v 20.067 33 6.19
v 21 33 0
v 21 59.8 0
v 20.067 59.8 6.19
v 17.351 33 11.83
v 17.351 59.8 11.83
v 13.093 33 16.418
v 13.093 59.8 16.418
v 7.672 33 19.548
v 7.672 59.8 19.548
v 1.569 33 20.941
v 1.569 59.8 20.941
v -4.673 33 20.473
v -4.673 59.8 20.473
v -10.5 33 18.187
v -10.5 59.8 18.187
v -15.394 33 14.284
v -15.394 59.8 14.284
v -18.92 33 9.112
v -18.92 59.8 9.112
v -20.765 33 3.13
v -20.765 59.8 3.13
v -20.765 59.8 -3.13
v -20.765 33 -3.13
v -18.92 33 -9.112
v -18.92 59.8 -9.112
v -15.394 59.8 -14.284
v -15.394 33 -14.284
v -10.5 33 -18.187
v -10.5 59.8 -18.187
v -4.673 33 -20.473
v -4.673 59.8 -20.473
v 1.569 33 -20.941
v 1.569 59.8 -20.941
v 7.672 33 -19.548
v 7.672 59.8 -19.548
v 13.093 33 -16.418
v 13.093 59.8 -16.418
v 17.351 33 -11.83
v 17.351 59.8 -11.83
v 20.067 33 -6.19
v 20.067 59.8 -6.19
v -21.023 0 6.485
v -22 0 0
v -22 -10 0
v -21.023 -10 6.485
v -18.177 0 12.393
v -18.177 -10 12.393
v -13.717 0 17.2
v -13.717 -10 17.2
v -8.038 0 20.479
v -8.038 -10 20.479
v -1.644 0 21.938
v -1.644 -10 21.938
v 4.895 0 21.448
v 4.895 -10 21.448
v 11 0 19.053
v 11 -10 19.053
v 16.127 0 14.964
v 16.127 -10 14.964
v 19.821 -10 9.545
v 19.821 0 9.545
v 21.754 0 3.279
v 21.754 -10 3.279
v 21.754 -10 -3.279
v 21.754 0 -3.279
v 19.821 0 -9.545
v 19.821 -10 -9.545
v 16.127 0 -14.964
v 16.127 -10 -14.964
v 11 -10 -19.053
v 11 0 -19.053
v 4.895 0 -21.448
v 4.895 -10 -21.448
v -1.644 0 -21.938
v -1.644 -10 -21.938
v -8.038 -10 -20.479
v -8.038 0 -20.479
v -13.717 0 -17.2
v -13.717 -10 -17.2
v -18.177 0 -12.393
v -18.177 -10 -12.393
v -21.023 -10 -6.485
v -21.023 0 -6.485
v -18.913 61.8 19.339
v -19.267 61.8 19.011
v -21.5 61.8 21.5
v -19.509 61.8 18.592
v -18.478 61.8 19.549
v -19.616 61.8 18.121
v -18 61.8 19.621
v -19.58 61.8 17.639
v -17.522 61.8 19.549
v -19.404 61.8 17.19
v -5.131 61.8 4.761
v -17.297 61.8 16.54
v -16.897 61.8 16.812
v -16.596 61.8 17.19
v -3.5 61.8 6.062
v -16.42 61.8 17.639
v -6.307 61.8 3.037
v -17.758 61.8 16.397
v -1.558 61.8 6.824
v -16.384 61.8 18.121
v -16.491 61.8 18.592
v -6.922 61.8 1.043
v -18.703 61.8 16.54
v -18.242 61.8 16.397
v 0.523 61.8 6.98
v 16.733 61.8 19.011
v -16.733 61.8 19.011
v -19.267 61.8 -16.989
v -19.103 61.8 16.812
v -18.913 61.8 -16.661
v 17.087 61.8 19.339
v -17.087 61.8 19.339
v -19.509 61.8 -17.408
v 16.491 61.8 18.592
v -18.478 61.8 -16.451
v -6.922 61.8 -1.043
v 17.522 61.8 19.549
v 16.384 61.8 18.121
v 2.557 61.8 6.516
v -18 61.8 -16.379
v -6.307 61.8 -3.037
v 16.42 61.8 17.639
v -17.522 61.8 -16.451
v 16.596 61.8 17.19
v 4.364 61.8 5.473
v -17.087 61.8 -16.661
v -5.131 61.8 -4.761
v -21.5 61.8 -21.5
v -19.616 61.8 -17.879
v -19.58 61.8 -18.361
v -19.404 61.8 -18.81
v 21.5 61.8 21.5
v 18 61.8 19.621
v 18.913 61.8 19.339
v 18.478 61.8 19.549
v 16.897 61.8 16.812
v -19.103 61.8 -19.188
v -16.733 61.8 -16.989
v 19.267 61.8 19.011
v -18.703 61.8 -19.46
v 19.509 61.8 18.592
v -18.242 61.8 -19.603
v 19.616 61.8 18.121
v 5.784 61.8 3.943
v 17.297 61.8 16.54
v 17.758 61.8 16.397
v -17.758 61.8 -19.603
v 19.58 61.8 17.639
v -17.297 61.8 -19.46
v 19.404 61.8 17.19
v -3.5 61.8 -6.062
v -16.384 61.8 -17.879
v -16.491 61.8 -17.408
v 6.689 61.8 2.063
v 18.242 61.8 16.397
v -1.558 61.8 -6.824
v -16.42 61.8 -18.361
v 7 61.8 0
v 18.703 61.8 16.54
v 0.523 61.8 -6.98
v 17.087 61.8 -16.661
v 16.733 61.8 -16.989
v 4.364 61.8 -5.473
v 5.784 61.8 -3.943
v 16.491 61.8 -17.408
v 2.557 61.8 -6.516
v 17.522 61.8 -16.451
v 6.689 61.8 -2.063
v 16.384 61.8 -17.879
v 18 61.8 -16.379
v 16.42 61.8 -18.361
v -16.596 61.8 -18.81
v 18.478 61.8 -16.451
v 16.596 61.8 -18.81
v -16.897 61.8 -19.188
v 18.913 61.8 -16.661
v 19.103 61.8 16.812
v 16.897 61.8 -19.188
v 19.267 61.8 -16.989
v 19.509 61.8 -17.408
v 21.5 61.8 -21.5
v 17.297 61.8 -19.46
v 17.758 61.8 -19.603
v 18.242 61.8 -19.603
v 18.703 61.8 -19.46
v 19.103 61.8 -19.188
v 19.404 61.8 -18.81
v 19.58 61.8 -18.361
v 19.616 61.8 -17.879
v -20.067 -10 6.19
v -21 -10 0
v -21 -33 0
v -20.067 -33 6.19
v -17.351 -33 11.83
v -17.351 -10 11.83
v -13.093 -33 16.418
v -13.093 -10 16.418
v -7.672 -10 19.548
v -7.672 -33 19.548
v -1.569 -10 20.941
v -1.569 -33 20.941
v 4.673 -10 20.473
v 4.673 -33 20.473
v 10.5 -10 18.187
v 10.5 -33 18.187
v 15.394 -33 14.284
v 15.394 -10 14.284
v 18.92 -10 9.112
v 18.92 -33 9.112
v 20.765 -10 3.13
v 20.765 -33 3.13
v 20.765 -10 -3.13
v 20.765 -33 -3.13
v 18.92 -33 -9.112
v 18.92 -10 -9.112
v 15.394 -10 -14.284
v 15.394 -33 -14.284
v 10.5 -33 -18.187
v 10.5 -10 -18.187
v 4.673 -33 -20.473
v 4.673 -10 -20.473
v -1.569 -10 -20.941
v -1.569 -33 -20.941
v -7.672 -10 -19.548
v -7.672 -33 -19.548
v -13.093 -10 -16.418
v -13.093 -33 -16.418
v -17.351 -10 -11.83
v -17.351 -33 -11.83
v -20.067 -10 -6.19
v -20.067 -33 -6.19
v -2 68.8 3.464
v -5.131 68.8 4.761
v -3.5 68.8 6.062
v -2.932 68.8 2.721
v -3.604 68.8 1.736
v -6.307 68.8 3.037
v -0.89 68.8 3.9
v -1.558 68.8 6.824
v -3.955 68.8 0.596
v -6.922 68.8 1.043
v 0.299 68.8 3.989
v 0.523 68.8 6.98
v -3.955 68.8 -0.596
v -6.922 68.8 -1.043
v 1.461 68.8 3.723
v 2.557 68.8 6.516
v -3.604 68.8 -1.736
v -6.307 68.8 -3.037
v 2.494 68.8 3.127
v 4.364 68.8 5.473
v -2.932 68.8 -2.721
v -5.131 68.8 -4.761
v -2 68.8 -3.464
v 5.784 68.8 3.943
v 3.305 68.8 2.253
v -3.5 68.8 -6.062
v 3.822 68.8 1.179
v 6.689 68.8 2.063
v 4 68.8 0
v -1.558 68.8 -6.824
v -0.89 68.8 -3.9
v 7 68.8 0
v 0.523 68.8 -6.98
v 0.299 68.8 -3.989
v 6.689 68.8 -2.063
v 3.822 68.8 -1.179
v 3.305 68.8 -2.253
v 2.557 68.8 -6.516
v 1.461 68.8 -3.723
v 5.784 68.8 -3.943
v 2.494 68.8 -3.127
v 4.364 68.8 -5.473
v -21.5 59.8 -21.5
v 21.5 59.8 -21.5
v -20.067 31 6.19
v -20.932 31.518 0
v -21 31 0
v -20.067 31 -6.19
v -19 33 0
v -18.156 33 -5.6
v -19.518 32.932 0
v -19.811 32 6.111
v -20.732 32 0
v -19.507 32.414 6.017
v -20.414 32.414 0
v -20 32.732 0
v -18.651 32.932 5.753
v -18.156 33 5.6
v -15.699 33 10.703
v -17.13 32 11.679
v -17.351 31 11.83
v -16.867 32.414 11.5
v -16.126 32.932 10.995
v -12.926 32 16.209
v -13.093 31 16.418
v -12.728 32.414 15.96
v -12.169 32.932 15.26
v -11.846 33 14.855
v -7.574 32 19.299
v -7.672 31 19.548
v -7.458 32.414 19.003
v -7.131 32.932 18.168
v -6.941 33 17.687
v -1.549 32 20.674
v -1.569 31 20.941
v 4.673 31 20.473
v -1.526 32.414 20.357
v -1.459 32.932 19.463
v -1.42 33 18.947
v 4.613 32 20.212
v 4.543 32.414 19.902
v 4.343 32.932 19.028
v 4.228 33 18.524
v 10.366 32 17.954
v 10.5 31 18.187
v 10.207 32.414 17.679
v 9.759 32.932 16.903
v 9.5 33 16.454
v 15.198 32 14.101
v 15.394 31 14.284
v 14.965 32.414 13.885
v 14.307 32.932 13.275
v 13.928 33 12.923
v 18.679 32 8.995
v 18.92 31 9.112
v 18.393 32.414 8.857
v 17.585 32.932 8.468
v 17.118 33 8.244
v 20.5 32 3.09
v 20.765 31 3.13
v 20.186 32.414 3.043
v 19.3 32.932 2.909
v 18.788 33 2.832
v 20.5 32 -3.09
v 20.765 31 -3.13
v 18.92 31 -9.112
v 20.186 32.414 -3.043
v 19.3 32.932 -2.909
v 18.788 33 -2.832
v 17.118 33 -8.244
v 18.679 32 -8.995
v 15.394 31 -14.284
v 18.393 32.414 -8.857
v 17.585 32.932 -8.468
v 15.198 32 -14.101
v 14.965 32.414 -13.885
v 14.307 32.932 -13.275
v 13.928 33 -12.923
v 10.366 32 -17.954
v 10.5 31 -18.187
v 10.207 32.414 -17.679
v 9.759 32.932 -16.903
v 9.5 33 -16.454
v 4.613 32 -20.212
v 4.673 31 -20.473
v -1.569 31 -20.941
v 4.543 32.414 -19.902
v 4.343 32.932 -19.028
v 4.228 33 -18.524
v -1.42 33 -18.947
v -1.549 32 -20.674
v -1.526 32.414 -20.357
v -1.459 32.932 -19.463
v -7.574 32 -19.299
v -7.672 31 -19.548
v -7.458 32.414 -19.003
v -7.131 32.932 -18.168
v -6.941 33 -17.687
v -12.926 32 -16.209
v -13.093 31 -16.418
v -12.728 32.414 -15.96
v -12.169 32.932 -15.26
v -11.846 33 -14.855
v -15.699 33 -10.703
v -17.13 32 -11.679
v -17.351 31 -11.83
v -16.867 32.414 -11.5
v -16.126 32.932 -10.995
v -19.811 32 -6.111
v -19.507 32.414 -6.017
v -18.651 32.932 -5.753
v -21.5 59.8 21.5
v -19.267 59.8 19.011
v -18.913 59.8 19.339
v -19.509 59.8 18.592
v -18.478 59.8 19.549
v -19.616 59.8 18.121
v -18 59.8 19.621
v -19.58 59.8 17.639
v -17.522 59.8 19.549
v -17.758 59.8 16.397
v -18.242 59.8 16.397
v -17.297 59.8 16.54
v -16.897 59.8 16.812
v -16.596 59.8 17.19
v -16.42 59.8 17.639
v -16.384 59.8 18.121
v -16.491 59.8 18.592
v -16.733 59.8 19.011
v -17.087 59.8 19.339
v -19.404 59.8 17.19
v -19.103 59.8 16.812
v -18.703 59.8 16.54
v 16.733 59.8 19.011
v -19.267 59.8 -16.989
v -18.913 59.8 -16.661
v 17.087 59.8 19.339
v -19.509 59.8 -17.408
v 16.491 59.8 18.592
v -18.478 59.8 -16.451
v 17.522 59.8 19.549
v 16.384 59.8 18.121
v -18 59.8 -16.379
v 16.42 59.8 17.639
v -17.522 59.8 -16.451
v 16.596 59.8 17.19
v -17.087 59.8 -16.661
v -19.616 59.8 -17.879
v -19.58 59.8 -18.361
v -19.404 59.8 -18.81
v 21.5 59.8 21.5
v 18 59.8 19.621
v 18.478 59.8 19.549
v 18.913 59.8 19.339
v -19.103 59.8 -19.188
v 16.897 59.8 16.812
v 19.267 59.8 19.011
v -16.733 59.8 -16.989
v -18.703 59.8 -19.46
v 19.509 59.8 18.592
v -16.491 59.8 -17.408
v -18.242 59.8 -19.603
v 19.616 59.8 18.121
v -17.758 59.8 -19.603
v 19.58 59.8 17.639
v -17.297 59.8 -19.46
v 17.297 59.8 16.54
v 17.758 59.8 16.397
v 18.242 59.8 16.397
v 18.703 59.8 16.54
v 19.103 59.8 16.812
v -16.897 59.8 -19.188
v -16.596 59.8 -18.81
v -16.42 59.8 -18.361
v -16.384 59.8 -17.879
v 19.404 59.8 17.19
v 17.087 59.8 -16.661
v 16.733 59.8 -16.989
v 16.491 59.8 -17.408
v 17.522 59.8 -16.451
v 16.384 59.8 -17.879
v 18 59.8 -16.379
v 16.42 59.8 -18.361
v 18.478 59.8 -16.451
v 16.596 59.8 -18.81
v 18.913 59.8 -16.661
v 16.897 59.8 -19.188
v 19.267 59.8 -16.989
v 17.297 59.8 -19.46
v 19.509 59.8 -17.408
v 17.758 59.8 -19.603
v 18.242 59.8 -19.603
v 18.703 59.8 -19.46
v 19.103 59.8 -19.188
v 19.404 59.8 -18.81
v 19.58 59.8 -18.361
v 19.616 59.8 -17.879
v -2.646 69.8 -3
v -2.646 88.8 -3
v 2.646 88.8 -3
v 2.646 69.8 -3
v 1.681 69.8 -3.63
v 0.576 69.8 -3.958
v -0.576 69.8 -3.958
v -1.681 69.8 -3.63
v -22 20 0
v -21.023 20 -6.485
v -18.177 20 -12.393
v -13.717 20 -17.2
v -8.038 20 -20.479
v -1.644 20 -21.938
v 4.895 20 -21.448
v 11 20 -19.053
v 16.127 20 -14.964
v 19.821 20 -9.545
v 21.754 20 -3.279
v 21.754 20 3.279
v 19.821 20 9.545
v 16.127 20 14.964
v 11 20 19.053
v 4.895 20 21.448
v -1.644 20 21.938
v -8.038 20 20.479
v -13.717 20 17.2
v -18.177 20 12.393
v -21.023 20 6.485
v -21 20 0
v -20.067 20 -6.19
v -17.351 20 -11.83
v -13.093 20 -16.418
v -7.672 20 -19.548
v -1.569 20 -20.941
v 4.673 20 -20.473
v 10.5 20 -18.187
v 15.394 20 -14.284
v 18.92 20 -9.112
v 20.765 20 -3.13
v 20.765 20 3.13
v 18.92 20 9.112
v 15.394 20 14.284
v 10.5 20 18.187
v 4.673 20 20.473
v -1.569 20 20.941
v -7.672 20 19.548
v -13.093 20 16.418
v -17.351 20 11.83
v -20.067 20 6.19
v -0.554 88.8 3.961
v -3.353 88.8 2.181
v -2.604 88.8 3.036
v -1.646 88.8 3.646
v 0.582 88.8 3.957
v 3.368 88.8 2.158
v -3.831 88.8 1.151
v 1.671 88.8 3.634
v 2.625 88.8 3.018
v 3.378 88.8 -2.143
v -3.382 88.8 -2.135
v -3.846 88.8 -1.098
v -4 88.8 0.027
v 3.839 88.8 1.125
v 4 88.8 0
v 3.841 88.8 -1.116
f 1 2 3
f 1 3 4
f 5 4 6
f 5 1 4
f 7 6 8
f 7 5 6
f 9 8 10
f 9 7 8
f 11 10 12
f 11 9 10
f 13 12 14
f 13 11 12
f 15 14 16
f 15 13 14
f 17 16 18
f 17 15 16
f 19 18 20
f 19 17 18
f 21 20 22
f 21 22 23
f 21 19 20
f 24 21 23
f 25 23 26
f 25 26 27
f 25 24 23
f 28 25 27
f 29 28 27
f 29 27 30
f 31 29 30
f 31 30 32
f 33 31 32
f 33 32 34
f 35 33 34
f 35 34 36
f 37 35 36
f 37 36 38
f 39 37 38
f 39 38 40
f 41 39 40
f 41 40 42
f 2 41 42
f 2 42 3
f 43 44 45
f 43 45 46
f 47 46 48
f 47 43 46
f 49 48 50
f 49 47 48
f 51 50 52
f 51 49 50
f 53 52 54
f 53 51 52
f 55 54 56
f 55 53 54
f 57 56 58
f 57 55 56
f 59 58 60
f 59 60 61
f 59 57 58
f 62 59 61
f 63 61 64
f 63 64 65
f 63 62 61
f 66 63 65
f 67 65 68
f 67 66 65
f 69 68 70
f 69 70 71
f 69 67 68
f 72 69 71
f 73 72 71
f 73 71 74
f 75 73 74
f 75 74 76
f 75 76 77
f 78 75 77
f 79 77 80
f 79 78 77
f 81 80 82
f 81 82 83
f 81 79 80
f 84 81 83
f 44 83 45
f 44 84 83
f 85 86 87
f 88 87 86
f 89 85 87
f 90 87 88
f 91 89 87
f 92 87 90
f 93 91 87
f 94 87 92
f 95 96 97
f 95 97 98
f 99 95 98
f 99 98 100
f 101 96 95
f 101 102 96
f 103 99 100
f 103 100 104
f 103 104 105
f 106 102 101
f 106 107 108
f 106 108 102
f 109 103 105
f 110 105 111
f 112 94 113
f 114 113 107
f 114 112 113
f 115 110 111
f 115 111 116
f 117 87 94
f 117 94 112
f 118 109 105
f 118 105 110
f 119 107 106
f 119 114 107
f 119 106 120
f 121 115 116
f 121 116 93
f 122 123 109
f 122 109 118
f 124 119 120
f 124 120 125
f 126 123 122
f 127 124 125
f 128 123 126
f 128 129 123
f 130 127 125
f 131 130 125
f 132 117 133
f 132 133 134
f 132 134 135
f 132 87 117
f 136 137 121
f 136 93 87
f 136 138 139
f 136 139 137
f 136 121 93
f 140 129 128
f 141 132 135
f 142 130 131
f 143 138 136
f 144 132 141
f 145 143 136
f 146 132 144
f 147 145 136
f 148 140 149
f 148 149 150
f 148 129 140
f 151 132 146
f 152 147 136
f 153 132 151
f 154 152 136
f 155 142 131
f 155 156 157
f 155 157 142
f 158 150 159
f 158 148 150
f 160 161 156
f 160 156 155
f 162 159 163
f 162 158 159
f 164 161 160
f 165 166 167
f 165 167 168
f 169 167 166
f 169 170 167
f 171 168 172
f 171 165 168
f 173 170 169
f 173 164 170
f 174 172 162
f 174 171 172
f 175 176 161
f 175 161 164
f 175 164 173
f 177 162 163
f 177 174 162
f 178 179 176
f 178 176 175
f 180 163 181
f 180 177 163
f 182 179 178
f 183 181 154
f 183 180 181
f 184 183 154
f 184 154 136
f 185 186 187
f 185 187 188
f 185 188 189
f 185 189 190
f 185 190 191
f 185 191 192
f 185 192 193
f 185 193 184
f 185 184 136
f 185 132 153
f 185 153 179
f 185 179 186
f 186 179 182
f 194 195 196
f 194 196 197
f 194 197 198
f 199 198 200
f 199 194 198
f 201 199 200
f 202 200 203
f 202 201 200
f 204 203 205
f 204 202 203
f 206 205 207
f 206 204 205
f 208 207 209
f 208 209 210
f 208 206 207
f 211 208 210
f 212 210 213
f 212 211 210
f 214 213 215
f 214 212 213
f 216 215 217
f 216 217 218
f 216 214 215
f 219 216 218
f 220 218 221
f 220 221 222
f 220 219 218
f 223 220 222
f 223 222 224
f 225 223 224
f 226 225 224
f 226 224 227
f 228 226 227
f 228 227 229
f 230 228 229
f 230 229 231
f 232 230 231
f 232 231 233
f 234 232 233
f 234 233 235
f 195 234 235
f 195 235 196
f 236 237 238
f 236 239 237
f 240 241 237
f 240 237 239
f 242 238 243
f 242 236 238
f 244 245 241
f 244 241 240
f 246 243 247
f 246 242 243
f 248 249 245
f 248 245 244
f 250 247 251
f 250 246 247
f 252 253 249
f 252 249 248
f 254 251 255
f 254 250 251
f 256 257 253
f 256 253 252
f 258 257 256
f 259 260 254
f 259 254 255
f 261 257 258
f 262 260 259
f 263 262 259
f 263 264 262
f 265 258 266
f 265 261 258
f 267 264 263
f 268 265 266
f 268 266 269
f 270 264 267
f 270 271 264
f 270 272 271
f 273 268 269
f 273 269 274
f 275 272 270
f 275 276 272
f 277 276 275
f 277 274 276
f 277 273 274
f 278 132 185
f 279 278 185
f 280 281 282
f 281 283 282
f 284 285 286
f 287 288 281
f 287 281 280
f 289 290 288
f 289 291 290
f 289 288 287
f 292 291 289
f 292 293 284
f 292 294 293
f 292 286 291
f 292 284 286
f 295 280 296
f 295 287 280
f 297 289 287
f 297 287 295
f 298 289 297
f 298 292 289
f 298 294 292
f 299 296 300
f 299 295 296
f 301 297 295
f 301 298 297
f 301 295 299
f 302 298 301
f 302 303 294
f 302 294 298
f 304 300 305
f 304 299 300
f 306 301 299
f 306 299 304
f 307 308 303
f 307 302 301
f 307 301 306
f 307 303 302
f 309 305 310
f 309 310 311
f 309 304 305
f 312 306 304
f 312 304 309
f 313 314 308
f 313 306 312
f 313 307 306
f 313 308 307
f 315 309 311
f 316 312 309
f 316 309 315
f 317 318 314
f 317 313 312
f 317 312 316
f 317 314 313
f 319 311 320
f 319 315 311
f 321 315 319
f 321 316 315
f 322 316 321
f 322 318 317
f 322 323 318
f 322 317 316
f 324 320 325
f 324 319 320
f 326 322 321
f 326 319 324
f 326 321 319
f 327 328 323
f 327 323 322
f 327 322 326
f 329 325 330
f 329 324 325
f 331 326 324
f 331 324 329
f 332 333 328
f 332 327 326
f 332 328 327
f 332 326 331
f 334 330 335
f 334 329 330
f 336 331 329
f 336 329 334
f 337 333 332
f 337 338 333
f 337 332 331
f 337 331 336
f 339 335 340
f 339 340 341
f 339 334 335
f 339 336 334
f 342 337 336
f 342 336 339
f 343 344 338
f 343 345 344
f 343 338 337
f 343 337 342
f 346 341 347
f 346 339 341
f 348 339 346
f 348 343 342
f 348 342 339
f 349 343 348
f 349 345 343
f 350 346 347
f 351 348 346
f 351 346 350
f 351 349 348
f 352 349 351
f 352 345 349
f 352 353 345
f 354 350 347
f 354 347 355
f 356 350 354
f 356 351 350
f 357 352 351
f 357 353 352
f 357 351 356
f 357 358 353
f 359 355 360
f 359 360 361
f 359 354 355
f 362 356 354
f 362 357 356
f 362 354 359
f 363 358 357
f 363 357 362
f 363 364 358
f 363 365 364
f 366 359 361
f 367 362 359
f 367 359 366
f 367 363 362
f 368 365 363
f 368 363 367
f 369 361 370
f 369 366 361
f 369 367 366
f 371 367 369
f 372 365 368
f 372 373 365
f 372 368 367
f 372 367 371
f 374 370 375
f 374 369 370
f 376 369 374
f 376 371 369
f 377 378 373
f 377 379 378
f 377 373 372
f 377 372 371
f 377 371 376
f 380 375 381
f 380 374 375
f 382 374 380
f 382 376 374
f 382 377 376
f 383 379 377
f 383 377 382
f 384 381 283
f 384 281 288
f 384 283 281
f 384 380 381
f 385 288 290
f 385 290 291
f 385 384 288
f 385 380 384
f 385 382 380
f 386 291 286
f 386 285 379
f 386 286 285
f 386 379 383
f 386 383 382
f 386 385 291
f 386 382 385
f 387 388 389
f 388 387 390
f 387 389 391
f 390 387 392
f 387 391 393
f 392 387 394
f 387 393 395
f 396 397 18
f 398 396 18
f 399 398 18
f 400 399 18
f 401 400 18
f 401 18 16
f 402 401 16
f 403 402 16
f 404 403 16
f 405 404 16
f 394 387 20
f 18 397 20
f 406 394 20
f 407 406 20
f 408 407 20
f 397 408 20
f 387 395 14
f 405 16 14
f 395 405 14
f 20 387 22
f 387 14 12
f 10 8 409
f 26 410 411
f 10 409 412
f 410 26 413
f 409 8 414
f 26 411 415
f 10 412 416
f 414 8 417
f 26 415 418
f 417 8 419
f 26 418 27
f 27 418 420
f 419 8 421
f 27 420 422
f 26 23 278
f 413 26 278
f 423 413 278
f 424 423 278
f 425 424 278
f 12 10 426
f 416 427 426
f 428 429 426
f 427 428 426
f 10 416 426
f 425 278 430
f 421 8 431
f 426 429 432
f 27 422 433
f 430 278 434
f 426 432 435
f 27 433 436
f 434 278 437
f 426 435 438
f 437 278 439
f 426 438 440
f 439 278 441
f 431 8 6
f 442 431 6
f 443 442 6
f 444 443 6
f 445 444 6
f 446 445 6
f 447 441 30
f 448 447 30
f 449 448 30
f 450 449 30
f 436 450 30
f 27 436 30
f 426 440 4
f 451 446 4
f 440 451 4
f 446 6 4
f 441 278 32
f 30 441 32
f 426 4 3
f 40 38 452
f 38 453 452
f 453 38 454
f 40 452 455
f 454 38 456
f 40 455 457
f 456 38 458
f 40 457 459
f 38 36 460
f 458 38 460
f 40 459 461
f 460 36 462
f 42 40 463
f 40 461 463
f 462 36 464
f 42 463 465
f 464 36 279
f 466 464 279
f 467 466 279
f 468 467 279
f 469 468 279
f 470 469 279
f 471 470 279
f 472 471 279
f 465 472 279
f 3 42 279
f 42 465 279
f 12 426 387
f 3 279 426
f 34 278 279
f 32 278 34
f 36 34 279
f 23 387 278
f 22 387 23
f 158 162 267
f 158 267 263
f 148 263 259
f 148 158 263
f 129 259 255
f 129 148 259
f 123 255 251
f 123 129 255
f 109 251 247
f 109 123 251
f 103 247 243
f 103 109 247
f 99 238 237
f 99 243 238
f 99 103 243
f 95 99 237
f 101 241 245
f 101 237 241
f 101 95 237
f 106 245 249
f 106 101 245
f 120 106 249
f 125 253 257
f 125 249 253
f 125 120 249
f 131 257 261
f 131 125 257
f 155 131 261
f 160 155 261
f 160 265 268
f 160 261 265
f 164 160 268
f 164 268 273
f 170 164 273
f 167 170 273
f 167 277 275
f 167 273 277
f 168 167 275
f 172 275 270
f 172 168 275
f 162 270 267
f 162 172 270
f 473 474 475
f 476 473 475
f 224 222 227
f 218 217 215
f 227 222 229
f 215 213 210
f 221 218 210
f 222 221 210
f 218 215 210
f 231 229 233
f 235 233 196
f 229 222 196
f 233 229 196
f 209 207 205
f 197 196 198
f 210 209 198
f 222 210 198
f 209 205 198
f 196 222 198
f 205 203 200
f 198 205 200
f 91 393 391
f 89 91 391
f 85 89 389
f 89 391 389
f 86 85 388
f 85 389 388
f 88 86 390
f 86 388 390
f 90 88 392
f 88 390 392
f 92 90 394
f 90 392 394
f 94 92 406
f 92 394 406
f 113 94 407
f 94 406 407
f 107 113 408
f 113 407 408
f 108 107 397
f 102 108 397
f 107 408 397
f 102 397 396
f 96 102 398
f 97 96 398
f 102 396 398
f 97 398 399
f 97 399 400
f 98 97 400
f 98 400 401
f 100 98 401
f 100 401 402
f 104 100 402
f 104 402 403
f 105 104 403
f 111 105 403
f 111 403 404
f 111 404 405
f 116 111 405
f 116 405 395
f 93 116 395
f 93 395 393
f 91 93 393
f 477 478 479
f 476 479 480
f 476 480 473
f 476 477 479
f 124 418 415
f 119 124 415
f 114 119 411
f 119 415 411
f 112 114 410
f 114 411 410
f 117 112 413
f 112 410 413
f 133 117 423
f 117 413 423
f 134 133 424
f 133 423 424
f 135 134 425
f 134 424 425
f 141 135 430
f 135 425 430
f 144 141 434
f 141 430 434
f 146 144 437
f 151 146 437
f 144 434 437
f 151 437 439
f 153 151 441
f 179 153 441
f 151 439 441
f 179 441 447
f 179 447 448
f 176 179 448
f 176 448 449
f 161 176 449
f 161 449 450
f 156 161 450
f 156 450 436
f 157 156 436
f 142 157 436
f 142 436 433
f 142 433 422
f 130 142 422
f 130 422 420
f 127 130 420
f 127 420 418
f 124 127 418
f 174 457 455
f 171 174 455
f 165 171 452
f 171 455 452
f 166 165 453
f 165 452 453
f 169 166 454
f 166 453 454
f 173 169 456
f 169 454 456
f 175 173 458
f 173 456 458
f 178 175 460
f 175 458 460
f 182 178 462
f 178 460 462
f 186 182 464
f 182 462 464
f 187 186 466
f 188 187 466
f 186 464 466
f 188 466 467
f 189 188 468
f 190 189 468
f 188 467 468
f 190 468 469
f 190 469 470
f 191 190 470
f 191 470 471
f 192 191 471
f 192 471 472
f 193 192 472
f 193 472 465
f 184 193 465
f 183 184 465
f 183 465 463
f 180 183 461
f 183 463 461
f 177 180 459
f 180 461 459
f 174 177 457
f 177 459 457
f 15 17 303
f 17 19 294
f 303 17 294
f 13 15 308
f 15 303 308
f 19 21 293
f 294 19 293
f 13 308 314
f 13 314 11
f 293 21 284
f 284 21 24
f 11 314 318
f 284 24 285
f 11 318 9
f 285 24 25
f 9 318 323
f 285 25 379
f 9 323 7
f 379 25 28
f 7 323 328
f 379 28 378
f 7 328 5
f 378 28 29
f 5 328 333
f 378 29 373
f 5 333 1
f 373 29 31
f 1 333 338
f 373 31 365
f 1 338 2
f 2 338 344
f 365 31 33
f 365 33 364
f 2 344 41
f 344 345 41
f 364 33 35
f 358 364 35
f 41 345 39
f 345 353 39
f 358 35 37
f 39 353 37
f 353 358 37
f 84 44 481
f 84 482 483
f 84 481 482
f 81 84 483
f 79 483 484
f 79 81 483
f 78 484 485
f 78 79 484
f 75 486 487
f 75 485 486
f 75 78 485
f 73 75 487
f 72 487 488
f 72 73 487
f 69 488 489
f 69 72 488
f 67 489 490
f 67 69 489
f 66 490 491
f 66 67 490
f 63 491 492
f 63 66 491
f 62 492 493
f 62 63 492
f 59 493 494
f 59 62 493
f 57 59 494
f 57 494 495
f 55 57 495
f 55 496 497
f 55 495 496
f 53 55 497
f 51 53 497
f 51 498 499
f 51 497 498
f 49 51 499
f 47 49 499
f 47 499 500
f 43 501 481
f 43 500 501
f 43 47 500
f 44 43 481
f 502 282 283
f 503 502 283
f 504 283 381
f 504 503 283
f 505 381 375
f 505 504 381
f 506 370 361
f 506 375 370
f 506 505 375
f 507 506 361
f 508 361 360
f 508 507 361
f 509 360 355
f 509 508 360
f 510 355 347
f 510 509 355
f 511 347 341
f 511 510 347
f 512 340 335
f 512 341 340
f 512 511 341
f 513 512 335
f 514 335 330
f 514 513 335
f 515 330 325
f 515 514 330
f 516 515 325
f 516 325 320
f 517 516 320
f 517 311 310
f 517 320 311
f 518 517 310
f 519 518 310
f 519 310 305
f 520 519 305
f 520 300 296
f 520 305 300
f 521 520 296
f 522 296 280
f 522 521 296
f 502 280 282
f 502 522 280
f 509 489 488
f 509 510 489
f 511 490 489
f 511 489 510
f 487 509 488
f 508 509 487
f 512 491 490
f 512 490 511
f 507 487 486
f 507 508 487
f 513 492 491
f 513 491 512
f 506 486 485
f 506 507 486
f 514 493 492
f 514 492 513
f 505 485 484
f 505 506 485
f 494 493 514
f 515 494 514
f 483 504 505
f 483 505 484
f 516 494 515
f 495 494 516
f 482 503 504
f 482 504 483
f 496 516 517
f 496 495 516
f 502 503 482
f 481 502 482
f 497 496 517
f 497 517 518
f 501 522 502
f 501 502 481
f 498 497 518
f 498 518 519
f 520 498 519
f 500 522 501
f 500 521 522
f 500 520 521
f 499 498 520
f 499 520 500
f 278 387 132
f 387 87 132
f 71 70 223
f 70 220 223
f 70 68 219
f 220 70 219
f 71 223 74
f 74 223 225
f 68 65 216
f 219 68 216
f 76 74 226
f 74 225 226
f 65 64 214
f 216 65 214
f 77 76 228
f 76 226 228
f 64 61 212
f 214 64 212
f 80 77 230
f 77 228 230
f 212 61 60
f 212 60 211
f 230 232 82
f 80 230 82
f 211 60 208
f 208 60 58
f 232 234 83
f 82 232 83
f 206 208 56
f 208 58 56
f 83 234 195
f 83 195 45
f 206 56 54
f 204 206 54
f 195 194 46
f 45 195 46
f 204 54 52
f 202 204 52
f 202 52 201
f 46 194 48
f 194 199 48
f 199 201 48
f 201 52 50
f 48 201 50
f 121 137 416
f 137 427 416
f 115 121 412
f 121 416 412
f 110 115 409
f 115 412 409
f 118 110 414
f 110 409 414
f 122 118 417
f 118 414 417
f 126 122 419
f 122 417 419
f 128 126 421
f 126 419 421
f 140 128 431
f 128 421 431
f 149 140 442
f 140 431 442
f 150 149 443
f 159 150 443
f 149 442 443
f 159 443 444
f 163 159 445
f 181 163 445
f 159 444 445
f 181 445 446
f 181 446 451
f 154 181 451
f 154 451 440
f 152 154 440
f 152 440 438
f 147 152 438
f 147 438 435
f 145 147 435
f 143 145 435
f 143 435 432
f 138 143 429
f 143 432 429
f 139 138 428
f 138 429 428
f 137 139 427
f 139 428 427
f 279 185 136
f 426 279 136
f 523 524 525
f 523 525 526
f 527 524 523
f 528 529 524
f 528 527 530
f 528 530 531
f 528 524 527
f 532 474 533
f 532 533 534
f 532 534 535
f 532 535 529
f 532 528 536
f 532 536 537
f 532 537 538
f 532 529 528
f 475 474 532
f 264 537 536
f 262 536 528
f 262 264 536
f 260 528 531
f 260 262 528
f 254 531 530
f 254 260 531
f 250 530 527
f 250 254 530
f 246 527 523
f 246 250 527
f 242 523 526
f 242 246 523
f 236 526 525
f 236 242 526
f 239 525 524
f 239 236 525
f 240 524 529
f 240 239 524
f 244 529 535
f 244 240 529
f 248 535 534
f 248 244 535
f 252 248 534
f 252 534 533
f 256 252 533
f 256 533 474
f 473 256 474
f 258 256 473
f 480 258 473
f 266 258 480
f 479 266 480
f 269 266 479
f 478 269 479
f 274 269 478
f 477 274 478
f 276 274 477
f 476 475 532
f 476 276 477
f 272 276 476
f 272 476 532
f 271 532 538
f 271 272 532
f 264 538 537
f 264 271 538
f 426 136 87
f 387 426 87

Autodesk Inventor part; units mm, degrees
ref_plane "YZ Plane" through (0, 0, 0) normal (1, 0, 0) x (0, 1, 0)
ref_plane "XZ Plane" through (0, 0, 0) normal (0, 1, 0) x (-1, 0, 0)
sketch "Sketch1" plane through (0, 0, 0) normal (0, 1, 0) x (-1, 0, 0)
  circle A0 centre (0, 0) radius 21
  circle A1 centre (0, 0) radius 22
  dimension "d0" = 42
  dimension "d105" = 44
extrude "Extrusion1" add sketch "Sketch1" along normal mid plane 66 contours A0
fillet "Fillet1" radius 2 1 edges at (21, 33, 0)
sketch "Sketch2" plane through (0, 33, 0) normal (0, 1, 0) x (1, 0, 0)
  circle A0 centre (0, 0) radius 21
  dimension "d4" = 42
extrude "Extrusion2" add sketch "Sketch2" along normal blind 28.8
sketch "Sketch14" plane through (0, 61.8, 0) normal (0, 1, 0) x (1, 0, 0)
  line L0 (-21.5, 21.5) -> (21.5, 21.5)
  line L1 (21.5, 21.5) -> (21.5, -21.5)
  line L2 (21.5, -21.5) -> (-21.5, -21.5)
  line L3 (-21.5, -21.5) -> (-21.5, 21.5)
  line L4 (-21.5, 21.5) -> (21.5, -21.5) construction
  line L5 (21.5, 21.5) -> (-21.5, -21.5) construction
  point P0 (0, 0)
  dimension "d81" = 43
  dimension "d82" = 43
extrude "Extrusion13" add sketch "Sketch14" against normal blind 2
sketch "Sketch15" plane through (0, 61.8, 0) normal (0, 1, 0) x (1, 0, 0)
  point P0 (0, 0)
  point P1 (-18, 18)
  point P2 (18, 18)
  point P3 (18, -18)
  point P4 (-18, -18)
  dimension "d85" = 36
  dimension "d86" = 36
  dimension "d87" = 18
  dimension "d88" = 18
hole "Hole2" at (-18, 61.8, -18) at (18, 61.8, -18) at (18, 61.8, 18) at (-18, 61.8, 18) direction (0, -1, 0) diameter 3.242 end through all thread size "M4x0.7" class "6H" standard "ISO Metric profile"
sketch "Sketch16" plane through (0, 61.8, 0) normal (0, 1, 0) x (1, 0, 0)
  point P0 (0, 0)
sketch "Sketch17" plane through (0, 61.8, 0) normal (0, 1, 0) x (1, 0, 0)
  circle A0 centre (0, 0) radius 7
  dimension "d96" = 14
extrude "Extrusion14" add sketch "Sketch17" along normal blind 7
sketch "Sketch18" plane through (0, 68.8, 0) normal (0, 1, 0) x (1, 0, 0)
  circle A0 centre (0, 0) radius 4
  dimension "d99" = 8
extrude "Extrusion15" add sketch "Sketch18" along normal blind 20
sketch "Sketch19" plane through (0, 88.8, 0) normal (0, 1, 0) x (1, 0, 0)
  circle A0 centre (0, 0) radius 4 projected
  line L0 (-2.6458, 3) -> (2.6458, 3)
  dimension "d102" = 3
extrude "Extrusion16" cut sketch "Sketch19" against normal blind 19 contours L0 A0 picked at (-0.6179, 3.1815)
extrude "Extrusion17" add sketch "Sketch1" along normal blind 20 and the other way blind 10
ref_plane "Work Plane3" through (21, 33, 0) normal (1, 0, 0) x (0, 0, -1)
sketch "Sketch20" plane through (21, 33, 0) normal (1, 0, 0) x (0, 0, -1)
  line L0 (20.5, 25.8) -> (20.5, 2.0287) construction
  line L1 (20.5, 2.0287) -> (-20.5, 2.0287) construction
  line L2 (-20.5, 2.0287) -> (-20.5, 25.8) construction
  line L3 (-20.5, 25.8) -> (20.5, 25.8) construction
  line L4 (21.5, 28.8) -> (21.5, 26.8) projected
  line L5 (-21.5, 28.8) -> (-21.5, 26.8) projected
  line L6 (21.5, 26.8) -> (-21.5, 26.8) projected
  point P0 (0, -33)
  dimension "d123" = 1
  dimension "d124" = 1
  dimension "d125" = 1
decal "Decal2"
properties part number "HCMUTE-CDT23-MOTOR_DC24V-100RPM-XD42GA775"
